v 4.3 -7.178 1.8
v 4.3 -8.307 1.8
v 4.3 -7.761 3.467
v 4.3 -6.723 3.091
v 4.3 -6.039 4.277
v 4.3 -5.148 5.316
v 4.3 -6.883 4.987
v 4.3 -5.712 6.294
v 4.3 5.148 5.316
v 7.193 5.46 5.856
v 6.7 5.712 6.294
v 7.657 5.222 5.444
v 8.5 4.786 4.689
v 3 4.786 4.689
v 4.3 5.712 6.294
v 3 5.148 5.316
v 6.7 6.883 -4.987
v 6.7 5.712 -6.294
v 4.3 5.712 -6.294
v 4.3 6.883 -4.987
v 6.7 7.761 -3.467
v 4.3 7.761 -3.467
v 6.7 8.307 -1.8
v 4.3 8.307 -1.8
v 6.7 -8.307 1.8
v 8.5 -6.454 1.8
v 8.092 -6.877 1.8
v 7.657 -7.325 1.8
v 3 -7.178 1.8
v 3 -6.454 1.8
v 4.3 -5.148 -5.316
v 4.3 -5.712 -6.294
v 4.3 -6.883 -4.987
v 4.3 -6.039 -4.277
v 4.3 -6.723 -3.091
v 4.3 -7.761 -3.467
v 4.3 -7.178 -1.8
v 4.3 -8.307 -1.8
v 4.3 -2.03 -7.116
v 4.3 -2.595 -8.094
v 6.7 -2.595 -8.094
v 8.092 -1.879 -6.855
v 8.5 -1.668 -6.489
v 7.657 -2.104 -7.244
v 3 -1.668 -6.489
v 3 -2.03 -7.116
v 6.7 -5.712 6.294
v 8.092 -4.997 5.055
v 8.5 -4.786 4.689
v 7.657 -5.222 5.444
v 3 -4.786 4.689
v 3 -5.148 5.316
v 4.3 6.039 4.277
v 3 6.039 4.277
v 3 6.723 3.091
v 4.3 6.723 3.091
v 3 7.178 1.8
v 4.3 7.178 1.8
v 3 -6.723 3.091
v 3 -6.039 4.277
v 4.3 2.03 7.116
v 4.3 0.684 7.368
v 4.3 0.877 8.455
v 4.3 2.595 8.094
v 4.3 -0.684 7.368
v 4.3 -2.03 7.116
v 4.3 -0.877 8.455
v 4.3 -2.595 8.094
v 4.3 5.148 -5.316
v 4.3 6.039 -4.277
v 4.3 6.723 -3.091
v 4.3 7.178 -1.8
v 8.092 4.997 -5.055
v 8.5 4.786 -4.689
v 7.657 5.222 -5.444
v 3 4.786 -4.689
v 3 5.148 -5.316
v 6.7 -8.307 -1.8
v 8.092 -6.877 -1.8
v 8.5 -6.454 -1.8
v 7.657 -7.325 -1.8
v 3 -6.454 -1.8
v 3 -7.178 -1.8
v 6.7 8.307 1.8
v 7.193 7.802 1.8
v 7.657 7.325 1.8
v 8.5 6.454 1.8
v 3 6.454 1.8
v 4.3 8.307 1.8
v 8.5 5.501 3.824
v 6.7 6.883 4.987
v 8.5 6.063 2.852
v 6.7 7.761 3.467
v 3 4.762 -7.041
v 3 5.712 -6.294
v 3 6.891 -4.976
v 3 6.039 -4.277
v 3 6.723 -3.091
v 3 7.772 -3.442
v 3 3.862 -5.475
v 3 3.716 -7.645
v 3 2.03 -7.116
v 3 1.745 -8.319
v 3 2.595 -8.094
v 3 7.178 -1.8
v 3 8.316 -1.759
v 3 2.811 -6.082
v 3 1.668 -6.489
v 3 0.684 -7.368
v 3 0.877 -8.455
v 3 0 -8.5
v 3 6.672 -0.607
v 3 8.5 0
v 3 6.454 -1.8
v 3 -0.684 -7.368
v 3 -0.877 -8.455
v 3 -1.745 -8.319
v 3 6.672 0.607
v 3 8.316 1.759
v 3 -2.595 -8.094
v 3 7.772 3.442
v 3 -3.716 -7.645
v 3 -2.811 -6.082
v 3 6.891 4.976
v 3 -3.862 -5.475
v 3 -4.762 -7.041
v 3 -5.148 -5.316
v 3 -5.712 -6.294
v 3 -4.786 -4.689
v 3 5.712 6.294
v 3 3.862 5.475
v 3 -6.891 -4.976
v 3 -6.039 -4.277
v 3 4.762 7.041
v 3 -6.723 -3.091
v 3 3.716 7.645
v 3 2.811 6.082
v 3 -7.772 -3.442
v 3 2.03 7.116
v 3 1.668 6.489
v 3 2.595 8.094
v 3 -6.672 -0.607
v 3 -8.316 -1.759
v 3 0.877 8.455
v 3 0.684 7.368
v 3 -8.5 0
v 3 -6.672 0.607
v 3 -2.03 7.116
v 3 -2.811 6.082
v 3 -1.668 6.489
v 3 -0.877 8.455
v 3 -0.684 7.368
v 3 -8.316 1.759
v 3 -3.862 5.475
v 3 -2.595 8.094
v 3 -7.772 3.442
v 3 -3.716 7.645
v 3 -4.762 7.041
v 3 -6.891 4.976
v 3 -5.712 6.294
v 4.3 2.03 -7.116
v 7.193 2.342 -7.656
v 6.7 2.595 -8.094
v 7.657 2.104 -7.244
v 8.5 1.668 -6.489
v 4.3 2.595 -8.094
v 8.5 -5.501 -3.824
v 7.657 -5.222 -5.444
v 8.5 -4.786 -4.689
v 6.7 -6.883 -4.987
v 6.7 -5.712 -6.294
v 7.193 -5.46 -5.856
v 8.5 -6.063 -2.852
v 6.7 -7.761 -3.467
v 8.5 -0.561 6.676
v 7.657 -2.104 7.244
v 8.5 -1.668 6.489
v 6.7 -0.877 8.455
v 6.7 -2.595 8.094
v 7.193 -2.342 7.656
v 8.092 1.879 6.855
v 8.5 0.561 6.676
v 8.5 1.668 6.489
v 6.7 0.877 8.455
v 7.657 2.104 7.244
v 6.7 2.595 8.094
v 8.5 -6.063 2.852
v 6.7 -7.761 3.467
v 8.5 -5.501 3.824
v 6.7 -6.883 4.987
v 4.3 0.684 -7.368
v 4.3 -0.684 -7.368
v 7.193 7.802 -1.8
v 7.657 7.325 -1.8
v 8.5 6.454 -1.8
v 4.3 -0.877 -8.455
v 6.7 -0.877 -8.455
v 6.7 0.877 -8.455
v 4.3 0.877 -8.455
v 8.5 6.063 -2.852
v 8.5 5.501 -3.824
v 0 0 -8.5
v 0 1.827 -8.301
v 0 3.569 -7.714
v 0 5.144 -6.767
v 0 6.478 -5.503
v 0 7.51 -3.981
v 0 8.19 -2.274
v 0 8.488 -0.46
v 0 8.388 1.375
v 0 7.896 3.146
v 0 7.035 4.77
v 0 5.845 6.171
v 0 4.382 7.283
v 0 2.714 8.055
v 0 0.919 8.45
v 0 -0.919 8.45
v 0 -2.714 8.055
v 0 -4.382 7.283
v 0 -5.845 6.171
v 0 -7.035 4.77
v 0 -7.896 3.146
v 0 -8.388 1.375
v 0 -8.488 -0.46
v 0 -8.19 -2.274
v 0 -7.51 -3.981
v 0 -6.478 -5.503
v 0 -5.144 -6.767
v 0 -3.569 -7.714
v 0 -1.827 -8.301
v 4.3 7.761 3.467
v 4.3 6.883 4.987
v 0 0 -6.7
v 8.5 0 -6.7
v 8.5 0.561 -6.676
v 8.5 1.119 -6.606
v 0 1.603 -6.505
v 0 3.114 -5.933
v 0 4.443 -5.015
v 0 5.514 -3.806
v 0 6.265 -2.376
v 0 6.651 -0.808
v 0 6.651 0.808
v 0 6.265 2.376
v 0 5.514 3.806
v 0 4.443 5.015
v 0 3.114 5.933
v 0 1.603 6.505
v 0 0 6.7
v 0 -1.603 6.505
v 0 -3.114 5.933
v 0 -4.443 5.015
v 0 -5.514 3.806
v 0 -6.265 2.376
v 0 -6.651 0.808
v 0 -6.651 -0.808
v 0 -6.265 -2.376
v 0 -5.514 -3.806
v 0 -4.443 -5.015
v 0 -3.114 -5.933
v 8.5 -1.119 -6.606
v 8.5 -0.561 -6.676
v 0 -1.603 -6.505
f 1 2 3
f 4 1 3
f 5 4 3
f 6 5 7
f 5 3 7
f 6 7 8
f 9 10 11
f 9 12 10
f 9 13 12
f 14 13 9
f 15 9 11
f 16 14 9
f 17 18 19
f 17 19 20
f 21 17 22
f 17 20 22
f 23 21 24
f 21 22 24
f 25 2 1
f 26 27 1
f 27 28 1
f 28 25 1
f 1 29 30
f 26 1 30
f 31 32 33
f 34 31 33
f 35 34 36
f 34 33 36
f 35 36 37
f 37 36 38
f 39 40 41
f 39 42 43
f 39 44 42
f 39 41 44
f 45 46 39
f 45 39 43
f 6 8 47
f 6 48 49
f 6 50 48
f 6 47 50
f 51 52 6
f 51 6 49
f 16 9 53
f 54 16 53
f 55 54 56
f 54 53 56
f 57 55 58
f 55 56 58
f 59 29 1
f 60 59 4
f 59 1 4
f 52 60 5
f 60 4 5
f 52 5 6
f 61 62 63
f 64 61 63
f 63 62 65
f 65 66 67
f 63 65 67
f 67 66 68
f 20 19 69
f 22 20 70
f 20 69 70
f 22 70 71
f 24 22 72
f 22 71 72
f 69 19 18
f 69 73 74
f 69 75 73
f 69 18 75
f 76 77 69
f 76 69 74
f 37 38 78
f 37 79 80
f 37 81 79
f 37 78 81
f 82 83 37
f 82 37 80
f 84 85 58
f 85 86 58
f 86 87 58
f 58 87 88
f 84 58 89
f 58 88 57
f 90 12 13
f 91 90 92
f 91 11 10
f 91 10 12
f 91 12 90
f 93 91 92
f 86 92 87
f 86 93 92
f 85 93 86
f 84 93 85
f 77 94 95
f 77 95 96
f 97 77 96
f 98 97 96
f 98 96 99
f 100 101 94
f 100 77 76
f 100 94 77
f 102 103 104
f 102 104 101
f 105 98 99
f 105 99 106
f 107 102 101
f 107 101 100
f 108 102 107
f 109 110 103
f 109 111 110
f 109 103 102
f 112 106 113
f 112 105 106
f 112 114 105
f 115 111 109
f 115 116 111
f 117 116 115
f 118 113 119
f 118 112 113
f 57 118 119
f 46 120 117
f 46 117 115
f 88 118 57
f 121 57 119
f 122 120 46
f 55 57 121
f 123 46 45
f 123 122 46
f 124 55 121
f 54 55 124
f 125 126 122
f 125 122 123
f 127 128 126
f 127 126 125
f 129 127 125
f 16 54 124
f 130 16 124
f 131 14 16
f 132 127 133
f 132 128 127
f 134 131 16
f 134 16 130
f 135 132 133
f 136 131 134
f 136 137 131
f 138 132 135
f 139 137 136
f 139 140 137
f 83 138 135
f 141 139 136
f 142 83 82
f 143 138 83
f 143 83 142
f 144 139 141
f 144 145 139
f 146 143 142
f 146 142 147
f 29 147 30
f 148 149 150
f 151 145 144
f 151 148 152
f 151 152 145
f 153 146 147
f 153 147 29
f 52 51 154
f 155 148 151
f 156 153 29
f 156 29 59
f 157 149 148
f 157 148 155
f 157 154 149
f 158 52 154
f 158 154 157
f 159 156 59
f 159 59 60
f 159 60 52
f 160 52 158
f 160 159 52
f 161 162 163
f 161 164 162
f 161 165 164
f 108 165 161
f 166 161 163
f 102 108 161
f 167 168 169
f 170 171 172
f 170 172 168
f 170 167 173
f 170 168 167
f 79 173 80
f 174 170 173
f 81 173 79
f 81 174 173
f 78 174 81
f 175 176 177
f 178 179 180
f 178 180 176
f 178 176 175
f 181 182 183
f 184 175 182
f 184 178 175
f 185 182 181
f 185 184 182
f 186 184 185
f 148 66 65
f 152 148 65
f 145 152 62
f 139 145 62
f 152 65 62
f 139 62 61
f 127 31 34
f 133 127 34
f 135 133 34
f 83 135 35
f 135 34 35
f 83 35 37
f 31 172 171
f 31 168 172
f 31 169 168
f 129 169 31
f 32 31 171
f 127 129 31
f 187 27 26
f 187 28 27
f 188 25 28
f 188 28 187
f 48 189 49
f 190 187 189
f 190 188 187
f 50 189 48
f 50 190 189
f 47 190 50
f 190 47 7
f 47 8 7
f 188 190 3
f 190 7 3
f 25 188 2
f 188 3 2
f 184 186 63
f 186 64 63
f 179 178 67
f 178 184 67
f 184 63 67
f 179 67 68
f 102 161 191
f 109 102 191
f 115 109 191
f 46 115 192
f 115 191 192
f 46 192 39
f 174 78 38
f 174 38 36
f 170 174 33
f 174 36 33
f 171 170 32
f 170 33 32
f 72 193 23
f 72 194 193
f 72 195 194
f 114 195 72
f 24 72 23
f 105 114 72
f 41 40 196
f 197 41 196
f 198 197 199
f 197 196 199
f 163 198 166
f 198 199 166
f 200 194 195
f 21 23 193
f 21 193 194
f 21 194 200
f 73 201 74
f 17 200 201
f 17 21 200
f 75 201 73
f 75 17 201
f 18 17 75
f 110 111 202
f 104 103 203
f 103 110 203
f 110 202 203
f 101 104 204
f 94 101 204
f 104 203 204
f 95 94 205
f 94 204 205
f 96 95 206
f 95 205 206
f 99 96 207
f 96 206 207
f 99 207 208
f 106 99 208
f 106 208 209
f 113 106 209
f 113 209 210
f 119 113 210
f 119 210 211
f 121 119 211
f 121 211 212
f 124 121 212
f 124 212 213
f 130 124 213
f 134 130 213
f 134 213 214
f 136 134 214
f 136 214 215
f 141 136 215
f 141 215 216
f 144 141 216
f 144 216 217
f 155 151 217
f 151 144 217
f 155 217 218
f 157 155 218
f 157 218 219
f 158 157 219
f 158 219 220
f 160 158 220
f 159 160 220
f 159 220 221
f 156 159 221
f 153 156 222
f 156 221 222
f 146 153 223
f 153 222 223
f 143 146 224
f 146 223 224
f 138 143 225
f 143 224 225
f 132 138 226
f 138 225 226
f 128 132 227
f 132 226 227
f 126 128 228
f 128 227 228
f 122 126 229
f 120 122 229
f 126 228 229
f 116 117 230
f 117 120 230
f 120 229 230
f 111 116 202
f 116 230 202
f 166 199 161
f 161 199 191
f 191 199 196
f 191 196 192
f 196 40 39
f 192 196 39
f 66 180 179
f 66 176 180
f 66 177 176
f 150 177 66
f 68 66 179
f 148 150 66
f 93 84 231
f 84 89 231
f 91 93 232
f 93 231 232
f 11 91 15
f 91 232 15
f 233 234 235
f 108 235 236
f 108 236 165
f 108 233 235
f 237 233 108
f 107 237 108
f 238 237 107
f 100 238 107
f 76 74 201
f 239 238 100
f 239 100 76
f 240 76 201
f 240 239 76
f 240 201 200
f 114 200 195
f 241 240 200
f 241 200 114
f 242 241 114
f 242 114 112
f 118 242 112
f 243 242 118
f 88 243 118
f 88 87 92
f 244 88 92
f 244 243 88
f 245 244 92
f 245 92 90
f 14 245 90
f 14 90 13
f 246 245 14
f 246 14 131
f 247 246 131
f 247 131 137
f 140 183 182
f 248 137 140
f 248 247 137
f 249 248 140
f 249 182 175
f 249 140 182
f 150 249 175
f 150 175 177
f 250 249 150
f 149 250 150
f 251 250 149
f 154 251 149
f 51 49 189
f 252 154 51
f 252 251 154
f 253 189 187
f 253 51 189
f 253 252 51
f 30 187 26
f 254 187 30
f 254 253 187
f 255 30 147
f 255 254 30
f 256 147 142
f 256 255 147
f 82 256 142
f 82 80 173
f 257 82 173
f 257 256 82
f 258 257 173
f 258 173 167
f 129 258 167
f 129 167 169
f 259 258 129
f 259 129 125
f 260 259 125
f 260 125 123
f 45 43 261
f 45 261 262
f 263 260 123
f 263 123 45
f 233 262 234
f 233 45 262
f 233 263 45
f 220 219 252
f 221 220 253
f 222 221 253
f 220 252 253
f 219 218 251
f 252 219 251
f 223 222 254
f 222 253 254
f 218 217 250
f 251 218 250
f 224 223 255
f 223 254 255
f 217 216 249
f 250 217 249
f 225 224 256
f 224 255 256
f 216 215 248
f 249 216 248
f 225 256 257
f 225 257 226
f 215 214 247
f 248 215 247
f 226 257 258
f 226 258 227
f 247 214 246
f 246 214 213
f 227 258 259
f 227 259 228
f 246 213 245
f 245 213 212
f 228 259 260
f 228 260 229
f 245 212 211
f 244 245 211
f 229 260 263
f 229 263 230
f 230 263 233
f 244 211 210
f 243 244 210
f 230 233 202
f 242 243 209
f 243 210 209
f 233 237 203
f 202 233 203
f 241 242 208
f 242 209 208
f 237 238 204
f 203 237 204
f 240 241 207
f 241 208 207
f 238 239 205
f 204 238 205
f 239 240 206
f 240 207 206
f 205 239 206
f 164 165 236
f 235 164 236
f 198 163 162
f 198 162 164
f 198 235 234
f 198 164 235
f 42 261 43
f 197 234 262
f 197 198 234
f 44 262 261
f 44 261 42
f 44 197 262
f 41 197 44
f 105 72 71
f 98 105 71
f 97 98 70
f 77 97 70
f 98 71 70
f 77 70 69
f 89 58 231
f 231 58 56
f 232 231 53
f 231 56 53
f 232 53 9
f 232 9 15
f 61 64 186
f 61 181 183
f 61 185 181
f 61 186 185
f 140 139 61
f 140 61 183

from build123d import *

# Parameters (mm, degrees)
SKETCH_1_R               = 8.5
SKETCH_1_R_2             = 6.7
EXTRUDE_1_DEPTH          = 8.5
SKETCH_2_W               = 1.3
SKETCH_2_H               = 1.1
SKETCH_4_W               = 3.6
SKETCH_4_H               = 17
CUT_EXTRUDE_1_DEPTH      = 8.5
PATTERN_START            = 3
PATTERN_CIRCULAR_1_DEPTH = 5.5000001


# Read off the part's stored shape, not the designer's step: Круговой массив1
with BuildPart() as part:
    # Эскиз1 → Вытянуть1 (new body)
    with BuildSketch(Plane(origin=(0, 0, 0), x_dir=(0, 0, -1), z_dir=(1, 0, 0))):
        Circle(SKETCH_1_R)
        Circle(SKETCH_1_R_2, mode=Mode.SUBTRACT)
    extrude(amount=EXTRUDE_1_DEPTH)

    # Эскиз2 → Вырез-Повернуть1 (revolve, cut)
    with BuildSketch(Plane.XY, mode=Mode.PRIVATE) as cut_revolve_1_sk:
        with Locations((3.65, 7.95)):
            Rectangle(SKETCH_2_W, SKETCH_2_H)
    revolve(cut_revolve_1_sk.sketch.rotate(Axis((8.5, 0, 0), (-1, 0, 0)), 90), axis=Axis((8.5, 0, 0), (-1, 0, 0)), mode=Mode.SUBTRACT)

    # Эскиз3 → Вырез-Повернуть2 (revolve, cut)
    with BuildSketch(Plane.XY, mode=Mode.PRIVATE) as cut_revolve_2_sk:
        Polygon((8.5, 6.7), (6.7, 8.5), (8.5, 8.5), align=None)
    revolve(cut_revolve_2_sk.sketch.rotate(Axis((8.5, 0, 0), (-1, 0, 0)), 90), axis=Axis((8.5, 0, 0), (-1, 0, 0)), mode=Mode.SUBTRACT)

    # Эскиз4 → Вырез-Вытянуть1 (cut)
    with BuildSketch(Plane(origin=(3, 0, 0), x_dir=(0, 0, -1), z_dir=(1, 0, 0))):
        Rectangle(SKETCH_4_W, SKETCH_4_H)
    extrude(amount=CUT_EXTRUDE_1_DEPTH, mode=Mode.SUBTRACT)

    # Круговой массив1 outline → Круговой массив1 (cut)
    with BuildSketch(Plane.YZ.offset(PATTERN_START)):
        with BuildLine():
            ThreePointArc((4.785686287, -4.689051798), (3.35, -5.802370205), (1.667994833, -6.489051798))
            Line((1.667994833, -6.489051798), (2.594767158, -8.094268552))
            ThreePointArc((2.594767158, -8.094268552), (4.25, -7.361215932), (5.712458612, -6.294268552))
            Line((5.712458612, -6.294268552), (4.785686287, -4.689051798))
        make_face()
        with BuildLine():
            ThreePointArc((-1.667994833, -6.489051798), (-3.35, -5.802370205), (-4.785686287, -4.689051798))
            Line((-4.785686287, -4.689051798), (-5.712458612, -6.294268552))
            ThreePointArc((-5.712458612, -6.294268552), (-4.25, -7.361215932), (-2.594767158, -8.094268552))
            Line((-2.594767158, -8.094268552), (-1.667994833, -6.489051798))
        make_face()
        with BuildLine():
            ThreePointArc((1.667994833, 6.489051798), (3.35, 5.802370205), (4.785686287, 4.689051798))
            Line((4.785686287, 4.689051798), (5.712458612, 6.294268552))
            ThreePointArc((5.712458612, 6.294268552), (4.25, 7.361215932), (2.594767158, 8.094268552))
            Line((2.594767158, 8.094268552), (1.667994833, 6.489051798))
        make_face()
        with BuildLine():
            ThreePointArc((-4.785686287, 4.689051798), (-3.35, 5.802370205), (-1.667994833, 6.489051798))
            Line((-1.667994833, 6.489051798), (-2.594767158, 8.094268552))
            ThreePointArc((-2.594767158, 8.094268552), (-4.25, 7.361215932), (-5.712458612, 6.294268552))
            Line((-5.712458612, 6.294268552), (-4.785686287, 4.689051798))
        make_face()
    extrude(amount=PATTERN_CIRCULAR_1_DEPTH, mode=Mode.SUBTRACT)


solid = part.part
